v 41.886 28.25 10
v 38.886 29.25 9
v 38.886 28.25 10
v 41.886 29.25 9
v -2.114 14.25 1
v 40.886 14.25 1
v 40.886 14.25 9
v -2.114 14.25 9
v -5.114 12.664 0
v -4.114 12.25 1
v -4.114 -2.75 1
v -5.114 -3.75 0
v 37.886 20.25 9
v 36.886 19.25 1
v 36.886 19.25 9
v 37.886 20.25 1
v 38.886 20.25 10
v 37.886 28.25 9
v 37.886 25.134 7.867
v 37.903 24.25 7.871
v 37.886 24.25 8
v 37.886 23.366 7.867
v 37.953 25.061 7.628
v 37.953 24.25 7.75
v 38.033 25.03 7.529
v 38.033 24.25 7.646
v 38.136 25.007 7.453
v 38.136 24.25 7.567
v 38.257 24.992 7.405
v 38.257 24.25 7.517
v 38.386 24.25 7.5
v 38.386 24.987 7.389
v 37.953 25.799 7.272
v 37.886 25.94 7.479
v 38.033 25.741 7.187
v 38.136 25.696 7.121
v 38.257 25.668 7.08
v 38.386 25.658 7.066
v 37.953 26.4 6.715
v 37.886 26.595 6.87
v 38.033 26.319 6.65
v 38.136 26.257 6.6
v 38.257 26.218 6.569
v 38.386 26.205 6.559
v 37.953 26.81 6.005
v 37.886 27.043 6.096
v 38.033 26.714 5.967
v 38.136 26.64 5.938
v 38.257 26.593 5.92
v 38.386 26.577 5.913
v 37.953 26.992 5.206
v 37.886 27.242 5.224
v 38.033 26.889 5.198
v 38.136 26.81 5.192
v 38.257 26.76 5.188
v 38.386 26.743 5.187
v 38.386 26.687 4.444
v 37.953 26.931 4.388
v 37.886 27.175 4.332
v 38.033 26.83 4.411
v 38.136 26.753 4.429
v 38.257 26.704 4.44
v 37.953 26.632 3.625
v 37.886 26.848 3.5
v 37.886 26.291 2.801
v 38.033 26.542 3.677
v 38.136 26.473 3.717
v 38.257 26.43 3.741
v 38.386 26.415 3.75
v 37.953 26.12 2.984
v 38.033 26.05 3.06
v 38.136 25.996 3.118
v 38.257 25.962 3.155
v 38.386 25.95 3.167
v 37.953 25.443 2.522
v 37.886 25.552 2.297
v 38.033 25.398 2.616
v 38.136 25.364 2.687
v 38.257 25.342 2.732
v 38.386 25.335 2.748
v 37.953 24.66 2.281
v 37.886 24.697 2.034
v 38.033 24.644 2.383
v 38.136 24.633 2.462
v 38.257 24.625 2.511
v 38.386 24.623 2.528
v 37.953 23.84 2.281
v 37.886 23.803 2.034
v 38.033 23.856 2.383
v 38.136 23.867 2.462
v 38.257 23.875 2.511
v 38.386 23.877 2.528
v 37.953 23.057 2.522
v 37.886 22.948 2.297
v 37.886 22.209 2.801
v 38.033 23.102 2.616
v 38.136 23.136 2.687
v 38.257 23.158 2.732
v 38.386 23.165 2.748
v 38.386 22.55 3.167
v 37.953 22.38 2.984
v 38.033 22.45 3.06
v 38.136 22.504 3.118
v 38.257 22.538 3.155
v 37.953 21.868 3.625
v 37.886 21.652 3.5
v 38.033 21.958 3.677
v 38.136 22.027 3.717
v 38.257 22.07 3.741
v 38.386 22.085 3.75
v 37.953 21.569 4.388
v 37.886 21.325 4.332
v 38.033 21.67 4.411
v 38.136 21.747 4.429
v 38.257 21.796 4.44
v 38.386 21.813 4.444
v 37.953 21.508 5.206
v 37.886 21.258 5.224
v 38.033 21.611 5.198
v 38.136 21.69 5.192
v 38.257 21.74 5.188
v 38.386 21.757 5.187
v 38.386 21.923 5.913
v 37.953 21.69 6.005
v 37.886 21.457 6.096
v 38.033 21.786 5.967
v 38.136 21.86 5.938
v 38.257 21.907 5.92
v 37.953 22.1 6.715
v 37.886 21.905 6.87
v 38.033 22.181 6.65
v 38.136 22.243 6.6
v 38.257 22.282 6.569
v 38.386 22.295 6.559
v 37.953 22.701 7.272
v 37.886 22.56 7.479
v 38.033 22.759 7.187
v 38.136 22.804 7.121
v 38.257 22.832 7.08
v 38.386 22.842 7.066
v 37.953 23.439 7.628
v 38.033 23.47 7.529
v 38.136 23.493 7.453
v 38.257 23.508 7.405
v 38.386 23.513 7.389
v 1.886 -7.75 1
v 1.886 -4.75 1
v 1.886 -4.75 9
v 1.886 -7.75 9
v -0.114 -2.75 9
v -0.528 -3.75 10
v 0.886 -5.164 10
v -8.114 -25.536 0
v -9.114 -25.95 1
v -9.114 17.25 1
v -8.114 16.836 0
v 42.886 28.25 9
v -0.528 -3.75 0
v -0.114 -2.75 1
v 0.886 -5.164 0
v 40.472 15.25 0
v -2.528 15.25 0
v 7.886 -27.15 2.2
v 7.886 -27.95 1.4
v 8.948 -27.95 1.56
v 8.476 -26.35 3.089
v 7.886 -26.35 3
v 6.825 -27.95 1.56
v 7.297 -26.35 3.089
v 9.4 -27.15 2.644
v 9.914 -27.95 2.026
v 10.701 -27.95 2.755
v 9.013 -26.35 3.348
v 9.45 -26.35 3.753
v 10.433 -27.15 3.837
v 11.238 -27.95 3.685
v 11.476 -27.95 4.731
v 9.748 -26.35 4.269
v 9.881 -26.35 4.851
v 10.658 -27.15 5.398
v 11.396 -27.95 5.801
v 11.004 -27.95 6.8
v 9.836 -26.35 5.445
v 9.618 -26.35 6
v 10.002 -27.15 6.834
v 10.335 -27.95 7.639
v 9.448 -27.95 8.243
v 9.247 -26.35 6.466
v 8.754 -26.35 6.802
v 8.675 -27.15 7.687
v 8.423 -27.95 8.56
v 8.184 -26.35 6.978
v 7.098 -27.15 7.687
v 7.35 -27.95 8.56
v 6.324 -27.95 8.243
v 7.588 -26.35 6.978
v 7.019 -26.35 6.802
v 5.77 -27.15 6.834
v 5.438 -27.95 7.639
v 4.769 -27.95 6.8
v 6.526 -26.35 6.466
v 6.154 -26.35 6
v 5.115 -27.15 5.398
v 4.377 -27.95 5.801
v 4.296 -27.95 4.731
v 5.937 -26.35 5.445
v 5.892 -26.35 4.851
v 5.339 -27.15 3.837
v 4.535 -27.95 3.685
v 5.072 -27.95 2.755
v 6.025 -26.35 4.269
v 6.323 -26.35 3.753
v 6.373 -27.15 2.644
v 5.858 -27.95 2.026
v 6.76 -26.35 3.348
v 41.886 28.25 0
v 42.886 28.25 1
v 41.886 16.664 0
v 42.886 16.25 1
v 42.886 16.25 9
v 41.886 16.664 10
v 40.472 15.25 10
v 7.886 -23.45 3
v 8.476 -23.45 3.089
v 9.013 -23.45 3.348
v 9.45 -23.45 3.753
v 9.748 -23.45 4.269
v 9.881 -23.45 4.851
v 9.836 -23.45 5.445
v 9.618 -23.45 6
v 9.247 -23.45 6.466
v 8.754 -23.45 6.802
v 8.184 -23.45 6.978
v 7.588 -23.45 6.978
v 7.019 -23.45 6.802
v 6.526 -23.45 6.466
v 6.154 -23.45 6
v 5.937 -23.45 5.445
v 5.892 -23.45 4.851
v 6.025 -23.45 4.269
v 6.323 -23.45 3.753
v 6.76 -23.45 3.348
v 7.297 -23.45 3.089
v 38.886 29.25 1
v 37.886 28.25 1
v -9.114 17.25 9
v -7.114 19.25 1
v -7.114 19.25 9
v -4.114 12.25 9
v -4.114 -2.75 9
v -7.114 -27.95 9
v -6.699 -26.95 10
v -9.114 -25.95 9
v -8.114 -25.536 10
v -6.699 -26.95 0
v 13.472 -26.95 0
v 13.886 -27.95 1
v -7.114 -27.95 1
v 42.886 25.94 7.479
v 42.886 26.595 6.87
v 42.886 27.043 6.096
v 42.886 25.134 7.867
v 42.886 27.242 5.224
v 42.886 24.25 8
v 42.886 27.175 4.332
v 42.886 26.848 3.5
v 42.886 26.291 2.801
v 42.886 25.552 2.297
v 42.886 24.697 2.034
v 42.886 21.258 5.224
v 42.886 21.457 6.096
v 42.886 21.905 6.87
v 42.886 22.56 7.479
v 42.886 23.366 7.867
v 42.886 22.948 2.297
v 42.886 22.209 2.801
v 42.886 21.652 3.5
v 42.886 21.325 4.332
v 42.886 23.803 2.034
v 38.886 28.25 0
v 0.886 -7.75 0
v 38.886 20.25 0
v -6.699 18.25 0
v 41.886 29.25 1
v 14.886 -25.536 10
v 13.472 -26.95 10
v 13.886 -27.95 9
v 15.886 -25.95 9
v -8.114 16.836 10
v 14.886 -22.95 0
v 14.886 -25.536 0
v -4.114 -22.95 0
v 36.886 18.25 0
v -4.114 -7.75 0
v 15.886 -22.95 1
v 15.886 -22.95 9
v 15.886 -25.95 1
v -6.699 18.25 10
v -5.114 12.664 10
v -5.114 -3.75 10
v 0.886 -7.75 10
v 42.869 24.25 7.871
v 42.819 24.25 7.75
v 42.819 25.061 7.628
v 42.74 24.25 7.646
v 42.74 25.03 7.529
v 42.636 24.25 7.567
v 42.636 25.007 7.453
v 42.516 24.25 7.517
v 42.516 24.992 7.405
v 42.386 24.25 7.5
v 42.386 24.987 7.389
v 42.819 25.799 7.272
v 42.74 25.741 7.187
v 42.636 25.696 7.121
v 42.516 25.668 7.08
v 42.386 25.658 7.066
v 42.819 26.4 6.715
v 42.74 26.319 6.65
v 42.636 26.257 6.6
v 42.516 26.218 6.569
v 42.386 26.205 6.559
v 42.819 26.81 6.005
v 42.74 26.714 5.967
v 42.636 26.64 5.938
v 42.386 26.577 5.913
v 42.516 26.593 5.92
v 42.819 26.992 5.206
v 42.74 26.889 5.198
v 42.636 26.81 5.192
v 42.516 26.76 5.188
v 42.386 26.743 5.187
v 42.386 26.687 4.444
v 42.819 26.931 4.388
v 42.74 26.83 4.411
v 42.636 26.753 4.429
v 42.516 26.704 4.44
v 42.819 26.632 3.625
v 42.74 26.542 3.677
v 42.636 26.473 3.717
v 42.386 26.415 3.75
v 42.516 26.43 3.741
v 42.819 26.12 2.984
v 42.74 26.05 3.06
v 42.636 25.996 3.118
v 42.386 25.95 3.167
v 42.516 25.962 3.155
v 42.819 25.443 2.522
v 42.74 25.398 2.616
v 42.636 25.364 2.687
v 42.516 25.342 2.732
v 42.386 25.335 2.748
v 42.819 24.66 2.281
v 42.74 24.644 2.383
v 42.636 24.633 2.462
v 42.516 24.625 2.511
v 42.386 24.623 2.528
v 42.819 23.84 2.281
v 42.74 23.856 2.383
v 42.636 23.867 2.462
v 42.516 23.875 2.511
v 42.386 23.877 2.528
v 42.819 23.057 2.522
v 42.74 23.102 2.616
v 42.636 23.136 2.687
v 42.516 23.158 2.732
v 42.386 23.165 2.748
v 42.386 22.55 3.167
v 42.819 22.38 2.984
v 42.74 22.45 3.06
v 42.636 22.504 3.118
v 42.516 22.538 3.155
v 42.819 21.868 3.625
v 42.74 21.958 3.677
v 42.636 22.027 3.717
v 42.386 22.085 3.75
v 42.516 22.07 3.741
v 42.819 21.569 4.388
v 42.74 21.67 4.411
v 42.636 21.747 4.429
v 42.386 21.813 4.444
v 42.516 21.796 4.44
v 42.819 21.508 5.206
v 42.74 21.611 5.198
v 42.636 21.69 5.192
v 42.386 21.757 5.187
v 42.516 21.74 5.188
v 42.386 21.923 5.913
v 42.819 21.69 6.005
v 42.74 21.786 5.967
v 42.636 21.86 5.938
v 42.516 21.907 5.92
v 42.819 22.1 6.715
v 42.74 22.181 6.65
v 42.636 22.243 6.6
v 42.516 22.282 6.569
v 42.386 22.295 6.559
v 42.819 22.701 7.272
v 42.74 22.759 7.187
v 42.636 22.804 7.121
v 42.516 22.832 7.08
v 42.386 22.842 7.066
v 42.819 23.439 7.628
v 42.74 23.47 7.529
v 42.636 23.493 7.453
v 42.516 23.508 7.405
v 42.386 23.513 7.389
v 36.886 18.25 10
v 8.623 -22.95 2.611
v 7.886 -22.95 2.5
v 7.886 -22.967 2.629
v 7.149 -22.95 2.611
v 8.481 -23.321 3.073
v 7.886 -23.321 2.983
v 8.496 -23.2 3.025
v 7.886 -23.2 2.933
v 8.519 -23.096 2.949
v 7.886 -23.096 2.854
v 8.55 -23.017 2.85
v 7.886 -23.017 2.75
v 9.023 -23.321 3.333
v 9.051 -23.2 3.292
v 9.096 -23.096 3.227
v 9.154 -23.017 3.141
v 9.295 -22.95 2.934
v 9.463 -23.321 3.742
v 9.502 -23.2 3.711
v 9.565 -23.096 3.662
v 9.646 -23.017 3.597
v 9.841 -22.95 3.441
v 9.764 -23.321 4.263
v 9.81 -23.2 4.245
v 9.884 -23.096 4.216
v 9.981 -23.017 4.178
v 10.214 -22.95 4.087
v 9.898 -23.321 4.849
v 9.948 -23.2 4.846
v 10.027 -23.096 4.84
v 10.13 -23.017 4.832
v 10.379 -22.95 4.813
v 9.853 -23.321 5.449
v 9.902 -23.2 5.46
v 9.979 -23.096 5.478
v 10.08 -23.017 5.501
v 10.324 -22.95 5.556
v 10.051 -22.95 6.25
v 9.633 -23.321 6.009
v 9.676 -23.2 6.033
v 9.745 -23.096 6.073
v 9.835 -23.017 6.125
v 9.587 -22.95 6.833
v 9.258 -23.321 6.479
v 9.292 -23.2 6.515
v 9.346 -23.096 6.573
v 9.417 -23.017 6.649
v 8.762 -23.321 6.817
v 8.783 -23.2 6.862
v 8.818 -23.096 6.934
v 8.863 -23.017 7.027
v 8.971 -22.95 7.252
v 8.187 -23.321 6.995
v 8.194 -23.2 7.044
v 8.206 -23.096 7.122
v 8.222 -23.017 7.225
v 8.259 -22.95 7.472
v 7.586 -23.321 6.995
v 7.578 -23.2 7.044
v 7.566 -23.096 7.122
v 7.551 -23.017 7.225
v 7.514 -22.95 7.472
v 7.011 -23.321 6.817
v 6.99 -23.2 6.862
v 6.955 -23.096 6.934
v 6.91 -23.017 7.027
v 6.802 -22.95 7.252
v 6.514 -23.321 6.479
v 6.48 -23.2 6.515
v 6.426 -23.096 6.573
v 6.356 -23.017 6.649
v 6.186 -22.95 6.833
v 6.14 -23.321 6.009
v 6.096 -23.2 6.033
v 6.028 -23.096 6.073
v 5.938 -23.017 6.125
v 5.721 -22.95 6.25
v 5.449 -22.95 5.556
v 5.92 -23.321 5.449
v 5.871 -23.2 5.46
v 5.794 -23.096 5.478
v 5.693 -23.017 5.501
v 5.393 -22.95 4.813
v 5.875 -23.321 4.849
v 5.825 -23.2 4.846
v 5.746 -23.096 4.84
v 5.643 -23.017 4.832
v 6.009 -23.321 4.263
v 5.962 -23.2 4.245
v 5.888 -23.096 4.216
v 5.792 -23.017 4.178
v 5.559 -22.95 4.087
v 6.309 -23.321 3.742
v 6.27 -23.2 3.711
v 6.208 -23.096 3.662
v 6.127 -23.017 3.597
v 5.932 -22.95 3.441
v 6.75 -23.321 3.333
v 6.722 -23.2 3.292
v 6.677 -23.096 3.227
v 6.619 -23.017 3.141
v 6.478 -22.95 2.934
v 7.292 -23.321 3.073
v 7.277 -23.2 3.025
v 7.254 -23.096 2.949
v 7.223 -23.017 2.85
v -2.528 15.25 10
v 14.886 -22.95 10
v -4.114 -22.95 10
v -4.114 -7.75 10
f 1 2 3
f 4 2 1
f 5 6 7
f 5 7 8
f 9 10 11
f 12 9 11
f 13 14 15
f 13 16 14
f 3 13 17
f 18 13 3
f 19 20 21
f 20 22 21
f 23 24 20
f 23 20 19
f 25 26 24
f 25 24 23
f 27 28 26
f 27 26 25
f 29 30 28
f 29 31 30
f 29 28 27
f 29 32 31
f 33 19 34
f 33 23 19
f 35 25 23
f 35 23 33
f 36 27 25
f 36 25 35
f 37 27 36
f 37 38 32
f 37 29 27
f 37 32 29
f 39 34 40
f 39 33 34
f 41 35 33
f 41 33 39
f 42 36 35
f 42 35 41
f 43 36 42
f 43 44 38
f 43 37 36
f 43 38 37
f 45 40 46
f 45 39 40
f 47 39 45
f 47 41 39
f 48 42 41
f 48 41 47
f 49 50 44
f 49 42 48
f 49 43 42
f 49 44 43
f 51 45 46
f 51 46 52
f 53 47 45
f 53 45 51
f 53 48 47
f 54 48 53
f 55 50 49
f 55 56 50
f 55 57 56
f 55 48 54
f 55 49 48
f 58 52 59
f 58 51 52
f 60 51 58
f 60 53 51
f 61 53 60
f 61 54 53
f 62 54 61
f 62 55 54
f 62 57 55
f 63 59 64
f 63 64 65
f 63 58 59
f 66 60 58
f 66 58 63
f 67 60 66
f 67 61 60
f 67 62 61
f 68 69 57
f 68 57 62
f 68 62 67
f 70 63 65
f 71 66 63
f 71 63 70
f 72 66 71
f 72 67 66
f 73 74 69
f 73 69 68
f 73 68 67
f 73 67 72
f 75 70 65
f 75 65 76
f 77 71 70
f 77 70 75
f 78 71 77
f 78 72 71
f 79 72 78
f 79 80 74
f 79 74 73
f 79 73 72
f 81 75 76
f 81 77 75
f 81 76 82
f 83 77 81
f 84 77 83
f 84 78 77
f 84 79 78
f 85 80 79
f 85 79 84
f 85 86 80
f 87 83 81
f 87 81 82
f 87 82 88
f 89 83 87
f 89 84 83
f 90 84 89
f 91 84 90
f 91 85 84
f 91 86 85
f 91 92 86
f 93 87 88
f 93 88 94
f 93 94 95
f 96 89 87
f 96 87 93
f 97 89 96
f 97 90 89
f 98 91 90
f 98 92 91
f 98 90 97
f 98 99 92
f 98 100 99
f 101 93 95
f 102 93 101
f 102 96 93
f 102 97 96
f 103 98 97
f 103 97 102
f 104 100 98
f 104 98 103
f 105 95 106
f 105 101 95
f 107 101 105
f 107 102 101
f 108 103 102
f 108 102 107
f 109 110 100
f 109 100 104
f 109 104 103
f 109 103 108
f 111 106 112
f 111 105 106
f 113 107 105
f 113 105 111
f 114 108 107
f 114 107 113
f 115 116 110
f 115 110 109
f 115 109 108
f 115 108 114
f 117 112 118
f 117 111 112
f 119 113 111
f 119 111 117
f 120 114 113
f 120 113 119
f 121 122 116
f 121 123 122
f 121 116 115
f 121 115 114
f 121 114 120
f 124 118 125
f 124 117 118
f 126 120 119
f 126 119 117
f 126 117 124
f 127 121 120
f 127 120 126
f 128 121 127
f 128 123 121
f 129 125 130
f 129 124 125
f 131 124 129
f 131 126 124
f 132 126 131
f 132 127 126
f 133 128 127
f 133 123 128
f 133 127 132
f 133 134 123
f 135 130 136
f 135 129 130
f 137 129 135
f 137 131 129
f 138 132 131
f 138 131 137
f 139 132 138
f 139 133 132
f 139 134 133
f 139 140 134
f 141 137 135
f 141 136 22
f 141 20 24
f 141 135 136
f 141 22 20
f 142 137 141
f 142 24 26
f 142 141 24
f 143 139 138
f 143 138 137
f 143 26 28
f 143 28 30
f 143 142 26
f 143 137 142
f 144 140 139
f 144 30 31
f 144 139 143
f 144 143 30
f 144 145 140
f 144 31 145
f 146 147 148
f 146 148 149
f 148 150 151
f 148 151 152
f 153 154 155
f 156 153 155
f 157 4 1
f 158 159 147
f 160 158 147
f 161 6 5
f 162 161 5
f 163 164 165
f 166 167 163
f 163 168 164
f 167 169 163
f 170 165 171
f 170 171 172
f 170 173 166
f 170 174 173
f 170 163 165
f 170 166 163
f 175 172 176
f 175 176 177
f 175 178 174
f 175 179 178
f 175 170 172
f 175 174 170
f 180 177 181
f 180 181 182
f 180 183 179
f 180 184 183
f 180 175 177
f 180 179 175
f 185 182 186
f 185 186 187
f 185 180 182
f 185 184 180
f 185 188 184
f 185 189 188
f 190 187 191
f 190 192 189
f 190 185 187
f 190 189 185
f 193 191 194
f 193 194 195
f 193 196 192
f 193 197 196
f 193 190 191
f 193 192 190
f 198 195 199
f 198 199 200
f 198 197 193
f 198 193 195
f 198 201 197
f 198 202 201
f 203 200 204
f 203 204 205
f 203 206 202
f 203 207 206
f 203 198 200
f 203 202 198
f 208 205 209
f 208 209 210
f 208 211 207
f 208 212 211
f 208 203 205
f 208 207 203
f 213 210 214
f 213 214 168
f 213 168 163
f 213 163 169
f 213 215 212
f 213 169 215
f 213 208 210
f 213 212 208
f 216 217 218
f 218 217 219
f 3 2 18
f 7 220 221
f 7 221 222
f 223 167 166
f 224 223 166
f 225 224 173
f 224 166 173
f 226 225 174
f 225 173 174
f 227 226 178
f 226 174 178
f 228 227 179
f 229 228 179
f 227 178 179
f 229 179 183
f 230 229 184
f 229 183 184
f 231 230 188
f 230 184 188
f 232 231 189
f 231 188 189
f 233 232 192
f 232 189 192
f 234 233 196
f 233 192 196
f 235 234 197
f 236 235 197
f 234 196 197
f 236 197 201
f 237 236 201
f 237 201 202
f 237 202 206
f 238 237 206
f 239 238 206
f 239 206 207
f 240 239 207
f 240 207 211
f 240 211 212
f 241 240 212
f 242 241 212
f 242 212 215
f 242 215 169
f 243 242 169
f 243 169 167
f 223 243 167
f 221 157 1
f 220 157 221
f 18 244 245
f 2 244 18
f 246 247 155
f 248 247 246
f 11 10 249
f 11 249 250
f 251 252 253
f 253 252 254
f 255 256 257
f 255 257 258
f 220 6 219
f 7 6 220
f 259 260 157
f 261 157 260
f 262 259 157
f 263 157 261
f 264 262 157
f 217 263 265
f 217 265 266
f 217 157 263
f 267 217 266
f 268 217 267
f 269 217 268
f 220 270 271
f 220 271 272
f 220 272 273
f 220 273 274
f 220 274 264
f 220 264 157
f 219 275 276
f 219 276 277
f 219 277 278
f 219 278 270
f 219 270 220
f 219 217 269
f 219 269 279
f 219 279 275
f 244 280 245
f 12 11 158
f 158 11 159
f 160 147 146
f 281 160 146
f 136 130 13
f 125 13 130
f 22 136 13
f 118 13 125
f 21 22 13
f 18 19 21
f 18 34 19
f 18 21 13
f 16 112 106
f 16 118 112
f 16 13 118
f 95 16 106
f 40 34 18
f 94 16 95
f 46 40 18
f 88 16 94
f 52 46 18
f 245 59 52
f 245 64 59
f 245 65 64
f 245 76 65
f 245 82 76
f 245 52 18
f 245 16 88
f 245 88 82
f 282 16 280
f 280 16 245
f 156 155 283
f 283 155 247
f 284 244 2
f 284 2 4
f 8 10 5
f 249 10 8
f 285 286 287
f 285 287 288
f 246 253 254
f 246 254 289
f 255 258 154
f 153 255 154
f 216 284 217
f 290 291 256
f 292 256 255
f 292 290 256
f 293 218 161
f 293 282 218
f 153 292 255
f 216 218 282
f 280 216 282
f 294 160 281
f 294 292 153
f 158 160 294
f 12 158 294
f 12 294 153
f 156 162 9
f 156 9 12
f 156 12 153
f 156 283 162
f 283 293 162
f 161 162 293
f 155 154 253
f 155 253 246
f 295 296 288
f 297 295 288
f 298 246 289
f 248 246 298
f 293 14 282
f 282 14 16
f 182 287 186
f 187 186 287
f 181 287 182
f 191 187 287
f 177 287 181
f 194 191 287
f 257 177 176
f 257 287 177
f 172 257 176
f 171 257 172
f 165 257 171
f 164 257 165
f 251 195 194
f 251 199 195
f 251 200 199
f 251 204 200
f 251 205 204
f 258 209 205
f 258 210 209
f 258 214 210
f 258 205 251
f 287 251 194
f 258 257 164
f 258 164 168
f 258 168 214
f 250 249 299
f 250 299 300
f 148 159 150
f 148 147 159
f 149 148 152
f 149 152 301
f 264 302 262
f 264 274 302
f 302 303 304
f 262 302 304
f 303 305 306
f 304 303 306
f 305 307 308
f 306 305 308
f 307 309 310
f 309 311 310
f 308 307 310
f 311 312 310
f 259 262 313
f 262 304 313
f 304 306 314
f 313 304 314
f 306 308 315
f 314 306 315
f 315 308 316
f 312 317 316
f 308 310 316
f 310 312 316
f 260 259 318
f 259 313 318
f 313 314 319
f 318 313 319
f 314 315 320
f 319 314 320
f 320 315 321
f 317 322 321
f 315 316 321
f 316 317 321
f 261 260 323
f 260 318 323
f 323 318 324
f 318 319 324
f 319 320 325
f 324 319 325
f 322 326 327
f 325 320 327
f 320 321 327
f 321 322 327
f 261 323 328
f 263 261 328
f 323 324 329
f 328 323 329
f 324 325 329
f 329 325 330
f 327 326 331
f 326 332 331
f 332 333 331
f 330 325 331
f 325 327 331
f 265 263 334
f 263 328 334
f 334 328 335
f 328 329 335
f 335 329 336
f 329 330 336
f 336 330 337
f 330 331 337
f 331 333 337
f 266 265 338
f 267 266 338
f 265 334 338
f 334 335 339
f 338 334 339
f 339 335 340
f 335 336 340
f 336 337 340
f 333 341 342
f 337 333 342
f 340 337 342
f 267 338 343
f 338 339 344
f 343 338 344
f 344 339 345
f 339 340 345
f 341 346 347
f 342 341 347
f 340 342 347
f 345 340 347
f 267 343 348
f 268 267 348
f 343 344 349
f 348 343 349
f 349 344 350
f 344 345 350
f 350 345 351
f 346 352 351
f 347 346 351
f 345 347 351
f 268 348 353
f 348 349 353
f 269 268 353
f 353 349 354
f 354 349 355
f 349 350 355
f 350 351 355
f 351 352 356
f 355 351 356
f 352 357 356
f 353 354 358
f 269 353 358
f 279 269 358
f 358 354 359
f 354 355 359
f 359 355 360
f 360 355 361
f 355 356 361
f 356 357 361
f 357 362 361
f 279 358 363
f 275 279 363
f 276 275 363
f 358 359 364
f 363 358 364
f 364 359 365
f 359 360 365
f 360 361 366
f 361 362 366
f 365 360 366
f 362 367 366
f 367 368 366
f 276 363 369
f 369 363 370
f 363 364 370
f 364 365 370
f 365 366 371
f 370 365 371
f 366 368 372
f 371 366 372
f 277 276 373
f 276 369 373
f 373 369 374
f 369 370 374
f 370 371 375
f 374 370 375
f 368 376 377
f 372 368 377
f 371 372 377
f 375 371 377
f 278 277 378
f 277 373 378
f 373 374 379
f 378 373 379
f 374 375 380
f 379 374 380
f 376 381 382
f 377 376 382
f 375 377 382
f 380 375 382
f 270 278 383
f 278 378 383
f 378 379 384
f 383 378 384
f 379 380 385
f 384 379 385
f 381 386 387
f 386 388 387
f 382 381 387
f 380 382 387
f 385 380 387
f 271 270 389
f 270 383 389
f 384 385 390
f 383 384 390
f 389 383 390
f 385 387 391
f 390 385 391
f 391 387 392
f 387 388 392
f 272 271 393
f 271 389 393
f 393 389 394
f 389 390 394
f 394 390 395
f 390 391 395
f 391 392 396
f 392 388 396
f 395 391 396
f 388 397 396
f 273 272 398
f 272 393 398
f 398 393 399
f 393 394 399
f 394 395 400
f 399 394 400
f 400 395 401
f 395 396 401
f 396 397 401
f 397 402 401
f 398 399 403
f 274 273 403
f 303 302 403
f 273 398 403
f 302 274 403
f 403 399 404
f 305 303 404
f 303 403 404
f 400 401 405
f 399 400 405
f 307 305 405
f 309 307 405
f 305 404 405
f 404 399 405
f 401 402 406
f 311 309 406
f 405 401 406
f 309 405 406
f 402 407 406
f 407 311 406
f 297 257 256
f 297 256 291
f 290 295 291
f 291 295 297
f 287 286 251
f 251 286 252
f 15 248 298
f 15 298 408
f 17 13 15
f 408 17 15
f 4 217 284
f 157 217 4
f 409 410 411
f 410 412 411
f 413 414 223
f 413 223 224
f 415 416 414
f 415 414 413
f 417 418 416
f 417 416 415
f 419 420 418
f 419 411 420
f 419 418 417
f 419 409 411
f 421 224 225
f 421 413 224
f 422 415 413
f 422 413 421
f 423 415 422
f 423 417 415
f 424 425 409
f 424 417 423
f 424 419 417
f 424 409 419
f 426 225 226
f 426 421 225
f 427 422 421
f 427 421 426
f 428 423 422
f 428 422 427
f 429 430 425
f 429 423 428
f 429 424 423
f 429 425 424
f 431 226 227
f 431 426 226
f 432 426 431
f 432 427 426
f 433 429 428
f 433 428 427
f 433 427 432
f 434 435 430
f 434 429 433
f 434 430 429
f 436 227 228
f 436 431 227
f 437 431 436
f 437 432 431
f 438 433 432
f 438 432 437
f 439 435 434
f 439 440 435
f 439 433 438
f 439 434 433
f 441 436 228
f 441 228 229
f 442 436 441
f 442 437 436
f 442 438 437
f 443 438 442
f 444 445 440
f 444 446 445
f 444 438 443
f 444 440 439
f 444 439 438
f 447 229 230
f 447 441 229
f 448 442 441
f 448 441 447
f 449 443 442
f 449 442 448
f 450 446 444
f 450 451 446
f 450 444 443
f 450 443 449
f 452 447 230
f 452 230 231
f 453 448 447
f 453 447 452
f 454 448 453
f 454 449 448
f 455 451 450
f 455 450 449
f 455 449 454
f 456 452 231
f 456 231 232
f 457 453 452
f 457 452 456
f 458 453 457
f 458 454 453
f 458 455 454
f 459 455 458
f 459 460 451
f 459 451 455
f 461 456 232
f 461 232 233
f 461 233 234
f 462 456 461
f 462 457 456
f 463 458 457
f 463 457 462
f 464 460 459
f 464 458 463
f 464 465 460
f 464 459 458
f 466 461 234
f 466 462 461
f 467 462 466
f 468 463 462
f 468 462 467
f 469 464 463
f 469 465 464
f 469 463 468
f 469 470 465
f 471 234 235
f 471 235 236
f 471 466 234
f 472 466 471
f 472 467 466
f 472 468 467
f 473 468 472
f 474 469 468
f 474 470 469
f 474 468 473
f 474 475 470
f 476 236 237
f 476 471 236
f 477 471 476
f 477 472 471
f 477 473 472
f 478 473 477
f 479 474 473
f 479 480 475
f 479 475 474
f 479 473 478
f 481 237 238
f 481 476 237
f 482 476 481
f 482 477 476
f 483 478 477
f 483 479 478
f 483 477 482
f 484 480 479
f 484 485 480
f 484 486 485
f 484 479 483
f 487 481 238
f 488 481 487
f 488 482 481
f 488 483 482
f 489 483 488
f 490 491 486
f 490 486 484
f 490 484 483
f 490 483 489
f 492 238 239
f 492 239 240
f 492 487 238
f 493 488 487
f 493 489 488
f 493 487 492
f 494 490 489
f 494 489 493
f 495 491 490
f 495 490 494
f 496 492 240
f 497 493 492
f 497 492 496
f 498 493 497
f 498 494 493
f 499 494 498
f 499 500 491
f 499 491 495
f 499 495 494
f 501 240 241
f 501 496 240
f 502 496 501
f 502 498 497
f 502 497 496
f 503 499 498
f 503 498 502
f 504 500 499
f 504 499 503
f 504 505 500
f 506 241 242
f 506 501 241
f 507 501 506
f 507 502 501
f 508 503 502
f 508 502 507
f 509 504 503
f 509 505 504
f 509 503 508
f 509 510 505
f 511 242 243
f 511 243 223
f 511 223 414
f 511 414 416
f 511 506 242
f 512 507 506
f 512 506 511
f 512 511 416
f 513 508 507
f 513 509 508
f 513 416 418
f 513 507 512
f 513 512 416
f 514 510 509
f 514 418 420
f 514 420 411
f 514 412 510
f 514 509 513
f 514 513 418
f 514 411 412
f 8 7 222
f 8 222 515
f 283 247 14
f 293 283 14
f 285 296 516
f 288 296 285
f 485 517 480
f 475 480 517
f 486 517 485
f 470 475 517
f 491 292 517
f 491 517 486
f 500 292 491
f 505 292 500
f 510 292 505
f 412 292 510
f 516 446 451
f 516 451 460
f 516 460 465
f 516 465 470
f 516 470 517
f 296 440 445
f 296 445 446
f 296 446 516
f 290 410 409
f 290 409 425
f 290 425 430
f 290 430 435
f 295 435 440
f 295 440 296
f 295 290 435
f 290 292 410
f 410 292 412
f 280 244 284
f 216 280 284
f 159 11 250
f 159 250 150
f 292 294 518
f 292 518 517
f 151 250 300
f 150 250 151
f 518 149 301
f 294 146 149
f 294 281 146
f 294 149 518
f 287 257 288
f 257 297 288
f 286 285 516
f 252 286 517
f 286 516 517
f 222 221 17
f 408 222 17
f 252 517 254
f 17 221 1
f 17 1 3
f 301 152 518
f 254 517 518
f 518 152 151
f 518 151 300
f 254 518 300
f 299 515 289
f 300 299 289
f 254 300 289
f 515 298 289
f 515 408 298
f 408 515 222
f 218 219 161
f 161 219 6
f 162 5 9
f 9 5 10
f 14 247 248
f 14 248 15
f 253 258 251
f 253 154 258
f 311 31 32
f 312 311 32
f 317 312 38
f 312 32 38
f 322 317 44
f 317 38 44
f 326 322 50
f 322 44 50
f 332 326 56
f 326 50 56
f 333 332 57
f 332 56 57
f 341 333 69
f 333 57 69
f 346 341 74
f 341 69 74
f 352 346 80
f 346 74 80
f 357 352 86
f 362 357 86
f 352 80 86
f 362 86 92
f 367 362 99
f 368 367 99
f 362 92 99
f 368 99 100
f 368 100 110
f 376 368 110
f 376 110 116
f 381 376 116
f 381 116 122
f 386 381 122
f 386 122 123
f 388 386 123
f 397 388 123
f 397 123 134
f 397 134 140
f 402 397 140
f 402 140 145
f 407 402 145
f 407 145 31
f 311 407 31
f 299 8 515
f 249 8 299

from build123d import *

# Parameters (mm, degrees)
RESSALTO_EXTRUS_O1_DEPTH = 10
ESBO_O3_R                = 2
CORTE_EXTRUS_O1_DEPTH    = 15
CHANFRO1_SIZE            = 1.6
FILETE1_R                = 0.5
CHANFRO5_SIZE            = 2
ESBO_O4_R                = 2.5
CORTE_EXTRUS_O2_DEPTH    = 10
CHANFRO8_SIZE            = 1
FILETE2_R                = 0.5


with BuildPart() as part:
    # Esboço1 → Ressalto-extrusão1 (new body)
    with BuildSketch(Plane.XY):
        Polygon((1.886382163, -7.75), (-4.113617837, -7.75), (-4.113617837, -22.95), (15.886382163, -22.95), (15.886382163, -27.95), (-9.113617837, -27.95), (-9.113617837, 19.25), (37.886382163, 19.25), (37.886382163, 29.25), (42.886382163, 29.25), (42.886382163, 14.25), (-4.113617837, 14.25), (-4.113617837, -2.75), (1.886382163, -2.75), align=None)
    extrude(amount=RESSALTO_EXTRUS_O1_DEPTH)

    # Esboço3 → Corte-extrusão1 (cut)
    with BuildSketch(Plane.XZ.offset(27.95)):
        with Locations(Location((7.886382163, 5, 0), (0, 0, 270))):
            Circle(ESBO_O3_R)
    extrude(amount=-CORTE_EXTRUS_O1_DEPTH, mode=Mode.SUBTRACT)

    # Chanfro1
    chanfro1_edges = [part.edges().sort_by_distance(p)[0] for p in [
        (7.886382163, -27.95, 7),
    ]]
    chamfer(chanfro1_edges, length=CHANFRO1_SIZE)

    # Filete1
    filete1_edges = [part.edges().sort_by_distance(p)[0] for p in [
        (7.886382163, -22.95, 7),
    ]]
    fillet(filete1_edges, radius=FILETE1_R)

    # Chanfro5
    chanfro5_edges = [part.edges().sort_by_distance(p)[0] for p in [
        (15.886382163, -27.95, 5),
        (-9.113617837, -27.95, 5),
        (-9.113617837, 19.25, 5),
        (42.886382163, 14.25, 5),
        (-4.113617837, 14.25, 5),
        (1.886382163, -2.75, 5),
    ]]
    chamfer(chanfro5_edges, length=CHANFRO5_SIZE)

    # Esboço4 → Corte-extrusão2 (cut)
    with BuildSketch(Plane.ZY.offset(-37.886382163)):
        with Locations((5, 24.25)):
            Circle(ESBO_O4_R)
    extrude(amount=-CORTE_EXTRUS_O2_DEPTH, mode=Mode.SUBTRACT)

    # Chanfro8
    chanfro8_edges = [part.edges().sort_by_distance(p)[0] for p in [
        (-4.113617837, 4.75, 10),
        (15.386382163, 19.25, 0),
        (37.886382163, 24.25, 0),
        (40.386382163, 29.25, 0),
        (-4.113617837, 4.75, 0),
        (1.886382163, -6.25, 0),
        (37.886382163, 19.25, 5),
        (37.886382163, 29.25, 5),
        (42.886382163, 29.25, 5),
        (40.386382163, 29.25, 10),
        (37.886382163, 24.25, 10),
        (15.386382163, 19.25, 10),
        (1.886382163, -6.25, 10),
        (-9.113617837, -4.35, 0),
        (-9.113617837, -4.35, 10),
        (15.886382163, -24.45, 0),
        (3.386382163, -27.95, 0),
        (42.886382163, 22.75, 0),
        (19.386382163, 14.25, 0),
        (-2.113617837, -2.75, 0),
        (0.886382163, -3.75, 0),
        (14.886382163, -26.95, 0),
        (-8.113617837, -26.95, 0),
        (41.886382163, 15.25, 0),
        (-8.113617837, 18.25, 0),
        (-2.113617837, -2.75, 10),
        (19.386382163, 14.25, 10),
        (42.886382163, 22.75, 10),
        (3.386382163, -27.95, 10),
        (15.886382163, -24.45, 10),
        (0.886382163, -3.75, 10),
        (14.886382163, -26.95, 10),
        (-8.113617837, -26.95, 10),
        (41.886382163, 15.25, 10),
        (-8.113617837, 18.25, 10),
        (-3.113617837, 13.25, 0),
        (-3.113617837, 13.25, 10),
    ]]
    chamfer(chanfro8_edges, length=CHANFRO8_SIZE)

    # Filete2
    filete2_edges = [part.edges().sort_by_distance(p)[0] for p in [
        (42.886382163, 24.25, 2.5),
        (37.886382163, 24.25, 2.5),
    ]]
    fillet(filete2_edges, radius=FILETE2_R)


solid = part.part
